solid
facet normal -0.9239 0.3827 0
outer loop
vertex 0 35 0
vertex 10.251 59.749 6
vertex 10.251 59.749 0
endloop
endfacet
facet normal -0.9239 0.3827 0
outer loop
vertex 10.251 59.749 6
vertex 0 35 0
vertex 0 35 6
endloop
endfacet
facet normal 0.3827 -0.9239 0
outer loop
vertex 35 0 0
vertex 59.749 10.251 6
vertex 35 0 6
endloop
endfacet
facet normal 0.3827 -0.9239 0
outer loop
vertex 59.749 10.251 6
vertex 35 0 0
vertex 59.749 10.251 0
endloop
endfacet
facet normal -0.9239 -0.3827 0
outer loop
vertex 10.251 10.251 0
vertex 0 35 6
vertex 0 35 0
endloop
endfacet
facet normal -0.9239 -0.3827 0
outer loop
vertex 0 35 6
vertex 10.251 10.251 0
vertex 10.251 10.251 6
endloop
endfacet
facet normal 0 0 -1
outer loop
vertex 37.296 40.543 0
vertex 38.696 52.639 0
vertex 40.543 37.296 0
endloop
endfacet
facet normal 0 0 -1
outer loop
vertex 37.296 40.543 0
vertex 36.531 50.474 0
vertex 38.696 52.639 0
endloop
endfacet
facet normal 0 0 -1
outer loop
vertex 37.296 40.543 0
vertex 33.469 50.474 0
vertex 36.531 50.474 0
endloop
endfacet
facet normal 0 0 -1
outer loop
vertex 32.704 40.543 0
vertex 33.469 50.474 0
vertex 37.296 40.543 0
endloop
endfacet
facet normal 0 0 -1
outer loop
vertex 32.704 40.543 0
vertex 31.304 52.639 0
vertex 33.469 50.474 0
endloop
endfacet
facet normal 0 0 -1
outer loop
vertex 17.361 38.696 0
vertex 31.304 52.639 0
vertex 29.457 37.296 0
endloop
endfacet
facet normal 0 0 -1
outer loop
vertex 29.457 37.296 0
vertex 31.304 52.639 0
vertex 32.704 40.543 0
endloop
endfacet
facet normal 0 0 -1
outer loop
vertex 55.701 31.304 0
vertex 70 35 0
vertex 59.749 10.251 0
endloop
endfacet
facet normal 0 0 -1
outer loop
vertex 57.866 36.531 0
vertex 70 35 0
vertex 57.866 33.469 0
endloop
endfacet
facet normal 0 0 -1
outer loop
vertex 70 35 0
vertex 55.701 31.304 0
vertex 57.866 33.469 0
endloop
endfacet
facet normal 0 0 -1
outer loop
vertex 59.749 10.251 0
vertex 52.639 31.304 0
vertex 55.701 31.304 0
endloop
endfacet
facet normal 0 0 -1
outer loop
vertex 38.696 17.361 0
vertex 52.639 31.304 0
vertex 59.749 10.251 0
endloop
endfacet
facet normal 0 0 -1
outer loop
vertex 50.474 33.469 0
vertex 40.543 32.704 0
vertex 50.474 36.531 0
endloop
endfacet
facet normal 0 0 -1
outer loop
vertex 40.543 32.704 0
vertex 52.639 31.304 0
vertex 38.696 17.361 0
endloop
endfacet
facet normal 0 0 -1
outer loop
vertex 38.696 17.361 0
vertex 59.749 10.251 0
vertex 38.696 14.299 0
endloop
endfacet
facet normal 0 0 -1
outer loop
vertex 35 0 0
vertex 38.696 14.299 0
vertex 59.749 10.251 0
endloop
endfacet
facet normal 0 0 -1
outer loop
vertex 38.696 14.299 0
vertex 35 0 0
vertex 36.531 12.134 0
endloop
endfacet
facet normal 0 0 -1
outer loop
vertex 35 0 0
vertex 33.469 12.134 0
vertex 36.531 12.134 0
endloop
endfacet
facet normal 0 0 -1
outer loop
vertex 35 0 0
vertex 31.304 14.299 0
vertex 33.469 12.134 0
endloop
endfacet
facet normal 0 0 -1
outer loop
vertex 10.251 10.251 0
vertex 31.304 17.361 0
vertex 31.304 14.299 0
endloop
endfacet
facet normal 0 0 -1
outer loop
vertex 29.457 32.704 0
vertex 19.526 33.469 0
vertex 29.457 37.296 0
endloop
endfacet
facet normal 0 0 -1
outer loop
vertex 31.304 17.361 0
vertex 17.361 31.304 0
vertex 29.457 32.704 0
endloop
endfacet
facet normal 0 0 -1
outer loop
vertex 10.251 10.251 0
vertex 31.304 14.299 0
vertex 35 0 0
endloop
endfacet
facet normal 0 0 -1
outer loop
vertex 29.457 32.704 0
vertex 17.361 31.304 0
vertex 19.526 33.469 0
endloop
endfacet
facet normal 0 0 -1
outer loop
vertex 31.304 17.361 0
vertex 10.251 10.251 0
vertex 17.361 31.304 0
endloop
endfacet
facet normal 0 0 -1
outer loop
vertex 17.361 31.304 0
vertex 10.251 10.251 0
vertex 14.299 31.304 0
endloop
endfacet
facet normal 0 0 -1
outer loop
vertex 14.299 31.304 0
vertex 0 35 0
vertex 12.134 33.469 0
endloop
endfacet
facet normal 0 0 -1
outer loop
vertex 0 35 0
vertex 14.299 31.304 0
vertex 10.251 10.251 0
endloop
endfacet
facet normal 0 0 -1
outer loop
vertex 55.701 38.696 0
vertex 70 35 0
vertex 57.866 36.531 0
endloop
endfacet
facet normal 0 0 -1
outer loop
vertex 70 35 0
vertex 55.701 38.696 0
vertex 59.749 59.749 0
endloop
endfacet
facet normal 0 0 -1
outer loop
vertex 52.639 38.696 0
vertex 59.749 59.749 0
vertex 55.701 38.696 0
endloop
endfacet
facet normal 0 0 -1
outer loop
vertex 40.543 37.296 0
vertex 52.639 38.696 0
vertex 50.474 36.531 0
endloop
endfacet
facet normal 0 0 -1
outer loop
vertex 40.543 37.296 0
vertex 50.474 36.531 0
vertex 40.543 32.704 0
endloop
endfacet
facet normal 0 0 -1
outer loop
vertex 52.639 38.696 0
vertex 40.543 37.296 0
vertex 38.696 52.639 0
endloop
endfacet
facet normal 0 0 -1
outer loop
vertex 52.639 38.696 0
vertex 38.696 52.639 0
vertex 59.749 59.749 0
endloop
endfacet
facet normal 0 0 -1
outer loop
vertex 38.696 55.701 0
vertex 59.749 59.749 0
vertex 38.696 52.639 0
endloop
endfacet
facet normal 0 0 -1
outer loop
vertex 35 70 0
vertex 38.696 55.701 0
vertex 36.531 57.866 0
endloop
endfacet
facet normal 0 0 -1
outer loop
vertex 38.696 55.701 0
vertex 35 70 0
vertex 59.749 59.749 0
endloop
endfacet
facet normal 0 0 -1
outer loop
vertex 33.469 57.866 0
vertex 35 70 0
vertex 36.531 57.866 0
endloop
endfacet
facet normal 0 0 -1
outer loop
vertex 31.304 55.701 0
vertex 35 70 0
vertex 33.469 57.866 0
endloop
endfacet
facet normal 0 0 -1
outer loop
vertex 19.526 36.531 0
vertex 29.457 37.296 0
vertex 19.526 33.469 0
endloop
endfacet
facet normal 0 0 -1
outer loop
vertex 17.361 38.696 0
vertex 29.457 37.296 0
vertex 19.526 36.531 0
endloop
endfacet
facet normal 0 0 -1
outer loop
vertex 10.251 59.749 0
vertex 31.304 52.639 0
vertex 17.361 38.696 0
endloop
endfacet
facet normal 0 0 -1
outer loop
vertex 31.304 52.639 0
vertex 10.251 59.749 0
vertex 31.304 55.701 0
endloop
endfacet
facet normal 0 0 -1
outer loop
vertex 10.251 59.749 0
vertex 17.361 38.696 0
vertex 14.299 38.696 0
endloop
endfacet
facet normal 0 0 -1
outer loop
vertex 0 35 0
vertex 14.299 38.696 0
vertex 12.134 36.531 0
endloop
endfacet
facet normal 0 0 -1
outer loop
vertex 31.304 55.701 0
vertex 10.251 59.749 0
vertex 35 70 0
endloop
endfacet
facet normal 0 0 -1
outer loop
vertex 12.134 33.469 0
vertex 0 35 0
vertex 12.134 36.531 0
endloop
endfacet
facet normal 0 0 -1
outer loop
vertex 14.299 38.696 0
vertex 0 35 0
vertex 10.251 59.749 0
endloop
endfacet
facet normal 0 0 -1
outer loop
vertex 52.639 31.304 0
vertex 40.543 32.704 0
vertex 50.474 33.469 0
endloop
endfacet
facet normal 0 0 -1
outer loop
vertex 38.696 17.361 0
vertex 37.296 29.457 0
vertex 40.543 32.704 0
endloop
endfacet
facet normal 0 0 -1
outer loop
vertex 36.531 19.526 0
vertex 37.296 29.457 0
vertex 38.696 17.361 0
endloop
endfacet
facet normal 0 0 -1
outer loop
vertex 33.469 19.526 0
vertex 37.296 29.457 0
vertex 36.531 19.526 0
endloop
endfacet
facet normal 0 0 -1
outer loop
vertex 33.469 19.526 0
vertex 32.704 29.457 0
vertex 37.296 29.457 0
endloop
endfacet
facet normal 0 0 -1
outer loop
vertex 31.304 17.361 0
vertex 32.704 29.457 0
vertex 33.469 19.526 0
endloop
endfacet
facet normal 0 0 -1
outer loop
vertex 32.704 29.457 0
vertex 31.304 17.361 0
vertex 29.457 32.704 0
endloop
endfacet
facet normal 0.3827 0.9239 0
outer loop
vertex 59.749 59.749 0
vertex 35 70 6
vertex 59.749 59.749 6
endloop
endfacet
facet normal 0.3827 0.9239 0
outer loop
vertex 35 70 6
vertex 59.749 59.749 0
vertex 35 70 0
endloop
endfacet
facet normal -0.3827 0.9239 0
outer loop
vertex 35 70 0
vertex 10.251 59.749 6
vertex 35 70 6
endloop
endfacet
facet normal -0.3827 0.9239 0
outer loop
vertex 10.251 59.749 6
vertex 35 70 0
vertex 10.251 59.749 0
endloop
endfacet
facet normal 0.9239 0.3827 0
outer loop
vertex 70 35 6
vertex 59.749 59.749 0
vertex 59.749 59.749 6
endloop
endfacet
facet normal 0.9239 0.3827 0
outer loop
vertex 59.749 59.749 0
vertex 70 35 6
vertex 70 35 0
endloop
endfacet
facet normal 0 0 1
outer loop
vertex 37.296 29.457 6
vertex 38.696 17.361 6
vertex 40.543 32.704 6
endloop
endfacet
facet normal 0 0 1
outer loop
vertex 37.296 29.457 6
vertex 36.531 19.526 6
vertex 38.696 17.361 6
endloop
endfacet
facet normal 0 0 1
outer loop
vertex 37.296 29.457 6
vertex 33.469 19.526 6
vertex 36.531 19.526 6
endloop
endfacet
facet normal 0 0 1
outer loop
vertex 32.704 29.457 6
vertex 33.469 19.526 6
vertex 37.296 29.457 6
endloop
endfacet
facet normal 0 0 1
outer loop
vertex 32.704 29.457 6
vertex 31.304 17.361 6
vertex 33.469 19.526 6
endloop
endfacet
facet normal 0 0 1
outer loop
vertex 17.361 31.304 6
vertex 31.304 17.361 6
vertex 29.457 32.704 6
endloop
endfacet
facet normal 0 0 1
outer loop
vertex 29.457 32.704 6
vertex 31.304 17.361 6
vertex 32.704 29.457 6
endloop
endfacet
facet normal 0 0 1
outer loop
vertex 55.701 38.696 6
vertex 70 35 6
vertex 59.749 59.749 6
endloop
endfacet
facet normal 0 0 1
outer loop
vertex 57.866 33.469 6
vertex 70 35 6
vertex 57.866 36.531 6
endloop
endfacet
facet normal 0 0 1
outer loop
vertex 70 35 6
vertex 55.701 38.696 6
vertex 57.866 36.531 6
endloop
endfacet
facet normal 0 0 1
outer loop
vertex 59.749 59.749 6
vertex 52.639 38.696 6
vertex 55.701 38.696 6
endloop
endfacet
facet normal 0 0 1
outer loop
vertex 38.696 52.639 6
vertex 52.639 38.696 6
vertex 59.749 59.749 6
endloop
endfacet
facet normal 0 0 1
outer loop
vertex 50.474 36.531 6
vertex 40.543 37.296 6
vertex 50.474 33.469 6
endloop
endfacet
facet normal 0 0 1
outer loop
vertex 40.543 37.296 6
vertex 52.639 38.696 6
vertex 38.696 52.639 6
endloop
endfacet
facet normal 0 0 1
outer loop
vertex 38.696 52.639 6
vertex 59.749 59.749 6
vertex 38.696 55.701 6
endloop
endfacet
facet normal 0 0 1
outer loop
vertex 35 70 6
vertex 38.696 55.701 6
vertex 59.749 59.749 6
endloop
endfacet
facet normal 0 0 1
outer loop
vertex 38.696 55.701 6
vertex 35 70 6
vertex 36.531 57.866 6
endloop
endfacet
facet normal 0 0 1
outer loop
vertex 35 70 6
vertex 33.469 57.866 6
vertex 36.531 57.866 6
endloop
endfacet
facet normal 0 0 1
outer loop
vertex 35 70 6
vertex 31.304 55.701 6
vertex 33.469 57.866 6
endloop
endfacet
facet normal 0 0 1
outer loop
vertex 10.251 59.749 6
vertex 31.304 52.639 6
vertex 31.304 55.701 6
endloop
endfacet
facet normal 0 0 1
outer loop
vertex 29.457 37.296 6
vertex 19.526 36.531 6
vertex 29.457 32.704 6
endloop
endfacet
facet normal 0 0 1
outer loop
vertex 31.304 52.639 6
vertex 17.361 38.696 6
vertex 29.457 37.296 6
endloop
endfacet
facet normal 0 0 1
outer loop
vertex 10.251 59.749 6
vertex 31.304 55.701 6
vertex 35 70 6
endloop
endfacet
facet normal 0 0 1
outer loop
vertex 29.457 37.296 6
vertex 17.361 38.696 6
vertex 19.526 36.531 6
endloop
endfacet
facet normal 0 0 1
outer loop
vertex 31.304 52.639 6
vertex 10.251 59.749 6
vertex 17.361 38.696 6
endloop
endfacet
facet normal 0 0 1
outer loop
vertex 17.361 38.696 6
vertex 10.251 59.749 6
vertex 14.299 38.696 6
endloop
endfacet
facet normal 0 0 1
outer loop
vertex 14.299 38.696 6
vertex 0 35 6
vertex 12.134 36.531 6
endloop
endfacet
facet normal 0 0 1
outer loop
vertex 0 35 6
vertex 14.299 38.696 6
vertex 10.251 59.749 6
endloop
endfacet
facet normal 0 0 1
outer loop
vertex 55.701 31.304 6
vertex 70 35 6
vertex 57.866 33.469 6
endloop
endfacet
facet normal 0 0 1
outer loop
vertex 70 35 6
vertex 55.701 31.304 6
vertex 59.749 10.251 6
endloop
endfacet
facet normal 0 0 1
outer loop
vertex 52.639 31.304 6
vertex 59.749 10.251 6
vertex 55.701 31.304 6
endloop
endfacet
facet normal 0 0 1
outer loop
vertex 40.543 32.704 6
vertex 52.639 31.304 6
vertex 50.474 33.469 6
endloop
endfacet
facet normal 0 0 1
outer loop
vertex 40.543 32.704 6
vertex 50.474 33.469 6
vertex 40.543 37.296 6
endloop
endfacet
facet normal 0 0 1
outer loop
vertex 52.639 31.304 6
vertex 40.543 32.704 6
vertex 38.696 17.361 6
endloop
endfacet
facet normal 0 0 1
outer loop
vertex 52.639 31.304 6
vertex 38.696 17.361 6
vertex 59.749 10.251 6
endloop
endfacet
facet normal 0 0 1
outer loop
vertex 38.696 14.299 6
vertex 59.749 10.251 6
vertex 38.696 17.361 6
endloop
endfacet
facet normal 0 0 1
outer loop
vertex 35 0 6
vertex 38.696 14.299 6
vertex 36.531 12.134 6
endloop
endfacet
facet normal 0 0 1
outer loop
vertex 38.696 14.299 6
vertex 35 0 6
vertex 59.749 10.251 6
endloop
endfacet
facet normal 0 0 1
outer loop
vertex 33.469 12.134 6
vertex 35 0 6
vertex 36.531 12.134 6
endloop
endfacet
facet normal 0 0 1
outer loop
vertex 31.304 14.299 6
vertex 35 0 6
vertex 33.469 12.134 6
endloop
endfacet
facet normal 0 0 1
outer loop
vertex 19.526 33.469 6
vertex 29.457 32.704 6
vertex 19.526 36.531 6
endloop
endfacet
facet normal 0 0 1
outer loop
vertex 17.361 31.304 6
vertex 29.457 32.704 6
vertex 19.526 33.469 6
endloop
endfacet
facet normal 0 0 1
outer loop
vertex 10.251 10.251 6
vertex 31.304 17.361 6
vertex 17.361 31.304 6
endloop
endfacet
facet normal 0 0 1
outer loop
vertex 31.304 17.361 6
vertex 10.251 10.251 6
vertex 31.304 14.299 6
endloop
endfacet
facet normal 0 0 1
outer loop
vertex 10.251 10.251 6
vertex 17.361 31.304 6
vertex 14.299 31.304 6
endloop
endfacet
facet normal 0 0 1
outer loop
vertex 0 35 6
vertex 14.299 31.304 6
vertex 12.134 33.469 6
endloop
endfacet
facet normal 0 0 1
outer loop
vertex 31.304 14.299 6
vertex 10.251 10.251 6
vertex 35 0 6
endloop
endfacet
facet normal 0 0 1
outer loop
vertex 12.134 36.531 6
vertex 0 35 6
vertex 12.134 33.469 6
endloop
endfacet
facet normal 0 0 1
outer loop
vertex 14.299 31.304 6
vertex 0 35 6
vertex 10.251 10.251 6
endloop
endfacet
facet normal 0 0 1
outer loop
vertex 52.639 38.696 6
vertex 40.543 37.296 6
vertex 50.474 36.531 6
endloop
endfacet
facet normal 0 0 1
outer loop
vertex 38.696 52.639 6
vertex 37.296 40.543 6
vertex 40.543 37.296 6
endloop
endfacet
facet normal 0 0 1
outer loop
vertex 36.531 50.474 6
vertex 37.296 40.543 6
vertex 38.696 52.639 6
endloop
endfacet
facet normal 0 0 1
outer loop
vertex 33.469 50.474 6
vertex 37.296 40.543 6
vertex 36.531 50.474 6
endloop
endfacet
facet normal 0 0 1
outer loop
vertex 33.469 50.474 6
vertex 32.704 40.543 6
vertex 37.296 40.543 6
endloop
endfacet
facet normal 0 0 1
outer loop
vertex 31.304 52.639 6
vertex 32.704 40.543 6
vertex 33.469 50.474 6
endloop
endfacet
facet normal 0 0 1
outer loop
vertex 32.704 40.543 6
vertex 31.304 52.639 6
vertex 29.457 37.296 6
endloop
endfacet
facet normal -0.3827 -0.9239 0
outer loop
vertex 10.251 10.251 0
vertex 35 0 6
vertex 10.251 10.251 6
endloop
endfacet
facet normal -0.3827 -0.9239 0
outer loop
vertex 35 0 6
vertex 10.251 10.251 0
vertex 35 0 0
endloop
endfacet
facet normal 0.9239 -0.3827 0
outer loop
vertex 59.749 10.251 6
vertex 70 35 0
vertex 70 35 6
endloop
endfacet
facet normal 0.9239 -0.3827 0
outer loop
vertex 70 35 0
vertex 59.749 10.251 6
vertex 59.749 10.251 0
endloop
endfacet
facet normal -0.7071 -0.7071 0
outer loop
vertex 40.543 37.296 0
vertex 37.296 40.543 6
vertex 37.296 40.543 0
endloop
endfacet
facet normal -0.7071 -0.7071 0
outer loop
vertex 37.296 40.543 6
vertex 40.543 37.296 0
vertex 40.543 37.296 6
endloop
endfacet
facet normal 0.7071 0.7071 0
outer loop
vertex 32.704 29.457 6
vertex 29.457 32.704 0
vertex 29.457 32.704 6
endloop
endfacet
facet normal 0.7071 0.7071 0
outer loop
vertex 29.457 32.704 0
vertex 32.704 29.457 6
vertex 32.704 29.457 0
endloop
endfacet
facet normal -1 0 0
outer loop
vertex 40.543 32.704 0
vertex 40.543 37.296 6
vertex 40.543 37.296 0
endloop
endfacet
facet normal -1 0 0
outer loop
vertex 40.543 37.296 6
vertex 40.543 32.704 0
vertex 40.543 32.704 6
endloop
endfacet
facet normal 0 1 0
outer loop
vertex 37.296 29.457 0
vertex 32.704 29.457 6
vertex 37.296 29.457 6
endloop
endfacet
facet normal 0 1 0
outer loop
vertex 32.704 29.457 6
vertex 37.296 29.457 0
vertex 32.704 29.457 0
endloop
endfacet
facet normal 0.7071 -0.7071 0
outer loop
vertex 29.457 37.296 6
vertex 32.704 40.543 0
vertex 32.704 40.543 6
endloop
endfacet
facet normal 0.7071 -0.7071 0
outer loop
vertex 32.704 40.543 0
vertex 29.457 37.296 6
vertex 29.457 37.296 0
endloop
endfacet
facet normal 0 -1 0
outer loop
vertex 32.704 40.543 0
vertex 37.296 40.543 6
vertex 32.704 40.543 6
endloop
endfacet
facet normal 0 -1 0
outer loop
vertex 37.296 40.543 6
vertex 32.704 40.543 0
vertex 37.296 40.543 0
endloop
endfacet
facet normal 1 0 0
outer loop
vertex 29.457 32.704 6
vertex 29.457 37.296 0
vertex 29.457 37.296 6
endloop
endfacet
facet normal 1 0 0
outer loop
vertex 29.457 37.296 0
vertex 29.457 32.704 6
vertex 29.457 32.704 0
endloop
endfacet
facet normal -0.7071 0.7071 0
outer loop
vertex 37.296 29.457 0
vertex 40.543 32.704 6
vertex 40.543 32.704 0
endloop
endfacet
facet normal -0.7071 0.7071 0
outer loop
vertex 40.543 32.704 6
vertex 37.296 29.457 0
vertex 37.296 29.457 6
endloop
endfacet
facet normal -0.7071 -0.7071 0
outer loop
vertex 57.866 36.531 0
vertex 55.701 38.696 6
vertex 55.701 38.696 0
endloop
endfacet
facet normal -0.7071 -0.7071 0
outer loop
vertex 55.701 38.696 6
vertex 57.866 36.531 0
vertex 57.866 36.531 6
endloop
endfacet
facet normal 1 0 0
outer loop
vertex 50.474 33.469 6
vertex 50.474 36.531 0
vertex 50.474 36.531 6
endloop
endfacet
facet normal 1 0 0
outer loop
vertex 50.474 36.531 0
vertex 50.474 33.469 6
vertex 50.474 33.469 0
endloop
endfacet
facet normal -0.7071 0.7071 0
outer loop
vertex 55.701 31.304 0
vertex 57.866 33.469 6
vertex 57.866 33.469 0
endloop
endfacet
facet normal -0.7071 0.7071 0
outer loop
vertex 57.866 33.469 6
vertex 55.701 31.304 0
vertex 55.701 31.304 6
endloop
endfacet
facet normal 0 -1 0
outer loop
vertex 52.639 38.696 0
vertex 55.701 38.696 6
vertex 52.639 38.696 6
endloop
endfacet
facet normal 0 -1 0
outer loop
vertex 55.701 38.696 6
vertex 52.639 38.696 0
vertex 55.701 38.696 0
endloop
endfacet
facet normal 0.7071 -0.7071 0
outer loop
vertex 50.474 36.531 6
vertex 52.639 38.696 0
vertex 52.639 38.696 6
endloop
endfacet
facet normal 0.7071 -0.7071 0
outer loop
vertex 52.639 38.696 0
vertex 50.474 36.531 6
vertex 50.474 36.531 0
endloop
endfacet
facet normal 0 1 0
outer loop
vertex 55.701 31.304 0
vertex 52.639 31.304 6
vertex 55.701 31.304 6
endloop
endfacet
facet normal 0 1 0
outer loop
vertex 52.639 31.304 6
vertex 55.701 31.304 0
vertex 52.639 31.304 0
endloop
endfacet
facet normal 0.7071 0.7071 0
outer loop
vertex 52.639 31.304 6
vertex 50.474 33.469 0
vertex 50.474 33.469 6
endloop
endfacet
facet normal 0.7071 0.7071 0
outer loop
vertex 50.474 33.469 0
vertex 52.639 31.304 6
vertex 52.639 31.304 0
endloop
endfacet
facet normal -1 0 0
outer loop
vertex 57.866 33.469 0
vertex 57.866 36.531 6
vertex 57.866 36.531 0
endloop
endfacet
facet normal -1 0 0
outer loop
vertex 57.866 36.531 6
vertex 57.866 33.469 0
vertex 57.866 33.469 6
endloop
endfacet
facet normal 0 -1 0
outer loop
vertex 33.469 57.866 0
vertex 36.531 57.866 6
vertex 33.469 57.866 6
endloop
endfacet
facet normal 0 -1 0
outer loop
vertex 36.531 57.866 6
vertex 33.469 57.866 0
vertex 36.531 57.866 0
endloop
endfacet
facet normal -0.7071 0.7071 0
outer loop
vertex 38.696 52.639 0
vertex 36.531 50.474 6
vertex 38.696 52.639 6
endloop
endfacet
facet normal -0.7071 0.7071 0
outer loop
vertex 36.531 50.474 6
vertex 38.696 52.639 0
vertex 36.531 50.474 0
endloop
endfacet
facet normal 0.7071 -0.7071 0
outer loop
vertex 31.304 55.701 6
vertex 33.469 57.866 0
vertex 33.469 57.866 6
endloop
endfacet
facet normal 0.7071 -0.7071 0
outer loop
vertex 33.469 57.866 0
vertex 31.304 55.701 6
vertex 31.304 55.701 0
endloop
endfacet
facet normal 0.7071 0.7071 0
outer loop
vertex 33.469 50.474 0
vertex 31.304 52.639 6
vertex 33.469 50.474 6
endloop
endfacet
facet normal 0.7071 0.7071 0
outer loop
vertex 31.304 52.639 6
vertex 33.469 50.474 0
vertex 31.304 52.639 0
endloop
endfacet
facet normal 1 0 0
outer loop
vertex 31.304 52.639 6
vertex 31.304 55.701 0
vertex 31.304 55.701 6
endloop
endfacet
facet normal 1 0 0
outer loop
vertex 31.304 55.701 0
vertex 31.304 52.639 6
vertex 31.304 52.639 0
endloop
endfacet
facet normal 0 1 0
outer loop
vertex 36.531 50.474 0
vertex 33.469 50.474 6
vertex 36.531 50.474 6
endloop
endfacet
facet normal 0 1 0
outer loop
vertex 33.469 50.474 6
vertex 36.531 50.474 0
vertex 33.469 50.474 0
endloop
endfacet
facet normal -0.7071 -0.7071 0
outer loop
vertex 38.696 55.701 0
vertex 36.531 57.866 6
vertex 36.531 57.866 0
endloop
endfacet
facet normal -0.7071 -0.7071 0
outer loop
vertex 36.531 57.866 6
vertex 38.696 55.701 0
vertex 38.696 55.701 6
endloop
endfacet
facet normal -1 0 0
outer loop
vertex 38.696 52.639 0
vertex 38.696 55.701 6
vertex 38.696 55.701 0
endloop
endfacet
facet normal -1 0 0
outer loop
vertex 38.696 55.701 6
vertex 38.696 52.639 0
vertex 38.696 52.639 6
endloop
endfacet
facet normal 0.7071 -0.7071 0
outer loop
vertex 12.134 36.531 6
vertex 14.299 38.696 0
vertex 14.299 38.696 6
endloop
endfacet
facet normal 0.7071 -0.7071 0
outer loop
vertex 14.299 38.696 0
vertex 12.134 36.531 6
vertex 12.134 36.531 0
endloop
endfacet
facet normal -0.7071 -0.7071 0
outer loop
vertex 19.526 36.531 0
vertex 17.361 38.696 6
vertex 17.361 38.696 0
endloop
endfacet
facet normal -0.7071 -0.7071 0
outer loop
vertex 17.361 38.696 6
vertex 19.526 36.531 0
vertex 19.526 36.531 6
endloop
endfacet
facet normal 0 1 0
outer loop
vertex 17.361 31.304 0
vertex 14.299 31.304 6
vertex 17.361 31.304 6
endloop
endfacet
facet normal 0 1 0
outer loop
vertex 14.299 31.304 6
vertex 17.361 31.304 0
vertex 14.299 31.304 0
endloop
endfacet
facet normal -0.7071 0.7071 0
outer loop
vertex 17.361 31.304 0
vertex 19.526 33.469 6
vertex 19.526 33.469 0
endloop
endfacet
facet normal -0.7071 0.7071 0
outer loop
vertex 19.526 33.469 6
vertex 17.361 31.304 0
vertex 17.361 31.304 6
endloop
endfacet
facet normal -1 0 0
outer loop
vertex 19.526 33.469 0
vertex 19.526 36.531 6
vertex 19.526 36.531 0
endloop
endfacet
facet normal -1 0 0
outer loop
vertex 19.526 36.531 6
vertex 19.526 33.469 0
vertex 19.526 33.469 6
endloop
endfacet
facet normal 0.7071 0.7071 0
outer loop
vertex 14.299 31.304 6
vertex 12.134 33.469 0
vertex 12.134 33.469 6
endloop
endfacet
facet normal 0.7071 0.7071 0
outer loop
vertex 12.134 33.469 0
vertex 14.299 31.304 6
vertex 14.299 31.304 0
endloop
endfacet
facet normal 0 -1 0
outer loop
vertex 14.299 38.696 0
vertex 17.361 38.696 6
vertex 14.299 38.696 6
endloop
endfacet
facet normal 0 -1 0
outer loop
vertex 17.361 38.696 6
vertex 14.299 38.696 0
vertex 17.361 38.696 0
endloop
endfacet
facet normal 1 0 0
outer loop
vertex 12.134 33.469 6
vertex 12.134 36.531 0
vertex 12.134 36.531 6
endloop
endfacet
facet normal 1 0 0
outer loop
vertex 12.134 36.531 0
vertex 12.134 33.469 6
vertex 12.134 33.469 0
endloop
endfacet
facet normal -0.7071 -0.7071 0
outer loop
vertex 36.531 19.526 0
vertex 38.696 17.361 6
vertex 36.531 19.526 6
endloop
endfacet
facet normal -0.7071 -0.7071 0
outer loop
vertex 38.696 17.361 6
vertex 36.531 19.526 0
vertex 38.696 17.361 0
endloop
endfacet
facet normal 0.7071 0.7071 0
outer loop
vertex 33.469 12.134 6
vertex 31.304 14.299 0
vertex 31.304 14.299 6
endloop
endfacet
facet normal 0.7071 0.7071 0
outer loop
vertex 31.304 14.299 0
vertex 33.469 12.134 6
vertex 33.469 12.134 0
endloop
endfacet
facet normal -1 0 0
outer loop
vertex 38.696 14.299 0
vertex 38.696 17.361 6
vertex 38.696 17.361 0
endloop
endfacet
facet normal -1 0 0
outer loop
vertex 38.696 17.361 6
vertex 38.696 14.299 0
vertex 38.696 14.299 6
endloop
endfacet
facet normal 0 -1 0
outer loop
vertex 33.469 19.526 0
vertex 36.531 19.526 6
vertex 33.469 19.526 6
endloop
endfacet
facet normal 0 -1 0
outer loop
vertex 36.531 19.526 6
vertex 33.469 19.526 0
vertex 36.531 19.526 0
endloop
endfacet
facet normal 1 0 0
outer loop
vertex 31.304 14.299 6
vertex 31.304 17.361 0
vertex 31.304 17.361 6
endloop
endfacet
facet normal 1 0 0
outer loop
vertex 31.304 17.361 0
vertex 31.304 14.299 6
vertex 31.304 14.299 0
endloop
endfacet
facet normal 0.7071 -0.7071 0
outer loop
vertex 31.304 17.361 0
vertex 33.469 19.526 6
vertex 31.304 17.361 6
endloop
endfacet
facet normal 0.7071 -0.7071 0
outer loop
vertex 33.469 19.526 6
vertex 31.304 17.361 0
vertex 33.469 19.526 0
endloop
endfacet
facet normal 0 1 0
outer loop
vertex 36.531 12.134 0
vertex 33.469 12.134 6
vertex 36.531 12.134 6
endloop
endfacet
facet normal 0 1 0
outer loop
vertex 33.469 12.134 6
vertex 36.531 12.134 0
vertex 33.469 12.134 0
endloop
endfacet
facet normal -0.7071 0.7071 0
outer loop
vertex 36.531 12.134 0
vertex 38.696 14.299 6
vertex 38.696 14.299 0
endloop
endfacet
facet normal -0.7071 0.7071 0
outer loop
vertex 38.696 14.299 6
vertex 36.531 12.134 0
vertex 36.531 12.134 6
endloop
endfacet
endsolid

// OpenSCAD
$fn = 32;

// ----------------------------------------------------------------------
// Polygon plate: 8-gon R35, 4 bolt windows
// ----------------------------------------------------------------------

// --- parameters (mm) ---
sides = 8;                // number of polygon sides
plate_r = 35;             // circumscribed radius of the polygon
bore_r = 6;               // centre bore radius
bolts = 4;                // number of bolt windows
ring_r = 19.17;           // bolt-circle radius
bolt_r = 4;               // bolt window radius
plate_t = 6;              // plate thickness, Z (extrusion height)

plate_d = 2 * plate_r;  // circumscribed diameter
bore_d = 2 * bore_r;  // centre bore diameter
bolt_d = 2 * bolt_r;  // bolt window diameter
ring_d = 2 * ring_r;  // bolt-circle diameter

profile = [[70, 35], [59.749, 59.749], [35, 70], [10.251, 59.749], [0, 35], [10.251, 10.251], [35, 0], [59.749, 10.251]];  // primary outline, 8 points, counter clockwise
void_1 = [[40.543, 37.296], [37.296, 40.543], [32.704, 40.543], [29.457, 37.296], [29.457, 32.704], [32.704, 29.457], [37.296, 29.457], [40.543, 32.704]];  // centre bore, 8 points
void_2 = [[57.866, 36.531], [55.701, 38.696], [52.639, 38.696], [50.474, 36.531], [50.474, 33.469], [52.639, 31.304], [55.701, 31.304], [57.866, 33.469]];  // bolt window 1, 8 points
void_3 = [[38.696, 55.701], [36.531, 57.866], [33.469, 57.866], [31.304, 55.701], [31.304, 52.639], [33.469, 50.474], [36.531, 50.474], [38.696, 52.639]];  // bolt window 2, 8 points
void_4 = [[19.526, 36.531], [17.361, 38.696], [14.299, 38.696], [12.134, 36.531], [12.134, 33.469], [14.299, 31.304], [17.361, 31.304], [19.526, 33.469]];  // bolt window 3, 8 points
void_5 = [[38.696, 17.361], [36.531, 19.526], [33.469, 19.526], [31.304, 17.361], [31.304, 14.299], [33.469, 12.134], [36.531, 12.134], [38.696, 14.299]];  // bolt window 4, 8 points

// --- the one profile operation ---
difference() {
  linear_extrude(height = plate_t) polygon(points = profile);
  translate([0, 0, -1])
    linear_extrude(height = plate_t + 2) polygon(points = void_1);
  translate([0, 0, -1])
    linear_extrude(height = plate_t + 2) polygon(points = void_2);
  translate([0, 0, -1])
    linear_extrude(height = plate_t + 2) polygon(points = void_3);
  translate([0, 0, -1])
    linear_extrude(height = plate_t + 2) polygon(points = void_4);
  translate([0, 0, -1])
    linear_extrude(height = plate_t + 2) polygon(points = void_5);
}
